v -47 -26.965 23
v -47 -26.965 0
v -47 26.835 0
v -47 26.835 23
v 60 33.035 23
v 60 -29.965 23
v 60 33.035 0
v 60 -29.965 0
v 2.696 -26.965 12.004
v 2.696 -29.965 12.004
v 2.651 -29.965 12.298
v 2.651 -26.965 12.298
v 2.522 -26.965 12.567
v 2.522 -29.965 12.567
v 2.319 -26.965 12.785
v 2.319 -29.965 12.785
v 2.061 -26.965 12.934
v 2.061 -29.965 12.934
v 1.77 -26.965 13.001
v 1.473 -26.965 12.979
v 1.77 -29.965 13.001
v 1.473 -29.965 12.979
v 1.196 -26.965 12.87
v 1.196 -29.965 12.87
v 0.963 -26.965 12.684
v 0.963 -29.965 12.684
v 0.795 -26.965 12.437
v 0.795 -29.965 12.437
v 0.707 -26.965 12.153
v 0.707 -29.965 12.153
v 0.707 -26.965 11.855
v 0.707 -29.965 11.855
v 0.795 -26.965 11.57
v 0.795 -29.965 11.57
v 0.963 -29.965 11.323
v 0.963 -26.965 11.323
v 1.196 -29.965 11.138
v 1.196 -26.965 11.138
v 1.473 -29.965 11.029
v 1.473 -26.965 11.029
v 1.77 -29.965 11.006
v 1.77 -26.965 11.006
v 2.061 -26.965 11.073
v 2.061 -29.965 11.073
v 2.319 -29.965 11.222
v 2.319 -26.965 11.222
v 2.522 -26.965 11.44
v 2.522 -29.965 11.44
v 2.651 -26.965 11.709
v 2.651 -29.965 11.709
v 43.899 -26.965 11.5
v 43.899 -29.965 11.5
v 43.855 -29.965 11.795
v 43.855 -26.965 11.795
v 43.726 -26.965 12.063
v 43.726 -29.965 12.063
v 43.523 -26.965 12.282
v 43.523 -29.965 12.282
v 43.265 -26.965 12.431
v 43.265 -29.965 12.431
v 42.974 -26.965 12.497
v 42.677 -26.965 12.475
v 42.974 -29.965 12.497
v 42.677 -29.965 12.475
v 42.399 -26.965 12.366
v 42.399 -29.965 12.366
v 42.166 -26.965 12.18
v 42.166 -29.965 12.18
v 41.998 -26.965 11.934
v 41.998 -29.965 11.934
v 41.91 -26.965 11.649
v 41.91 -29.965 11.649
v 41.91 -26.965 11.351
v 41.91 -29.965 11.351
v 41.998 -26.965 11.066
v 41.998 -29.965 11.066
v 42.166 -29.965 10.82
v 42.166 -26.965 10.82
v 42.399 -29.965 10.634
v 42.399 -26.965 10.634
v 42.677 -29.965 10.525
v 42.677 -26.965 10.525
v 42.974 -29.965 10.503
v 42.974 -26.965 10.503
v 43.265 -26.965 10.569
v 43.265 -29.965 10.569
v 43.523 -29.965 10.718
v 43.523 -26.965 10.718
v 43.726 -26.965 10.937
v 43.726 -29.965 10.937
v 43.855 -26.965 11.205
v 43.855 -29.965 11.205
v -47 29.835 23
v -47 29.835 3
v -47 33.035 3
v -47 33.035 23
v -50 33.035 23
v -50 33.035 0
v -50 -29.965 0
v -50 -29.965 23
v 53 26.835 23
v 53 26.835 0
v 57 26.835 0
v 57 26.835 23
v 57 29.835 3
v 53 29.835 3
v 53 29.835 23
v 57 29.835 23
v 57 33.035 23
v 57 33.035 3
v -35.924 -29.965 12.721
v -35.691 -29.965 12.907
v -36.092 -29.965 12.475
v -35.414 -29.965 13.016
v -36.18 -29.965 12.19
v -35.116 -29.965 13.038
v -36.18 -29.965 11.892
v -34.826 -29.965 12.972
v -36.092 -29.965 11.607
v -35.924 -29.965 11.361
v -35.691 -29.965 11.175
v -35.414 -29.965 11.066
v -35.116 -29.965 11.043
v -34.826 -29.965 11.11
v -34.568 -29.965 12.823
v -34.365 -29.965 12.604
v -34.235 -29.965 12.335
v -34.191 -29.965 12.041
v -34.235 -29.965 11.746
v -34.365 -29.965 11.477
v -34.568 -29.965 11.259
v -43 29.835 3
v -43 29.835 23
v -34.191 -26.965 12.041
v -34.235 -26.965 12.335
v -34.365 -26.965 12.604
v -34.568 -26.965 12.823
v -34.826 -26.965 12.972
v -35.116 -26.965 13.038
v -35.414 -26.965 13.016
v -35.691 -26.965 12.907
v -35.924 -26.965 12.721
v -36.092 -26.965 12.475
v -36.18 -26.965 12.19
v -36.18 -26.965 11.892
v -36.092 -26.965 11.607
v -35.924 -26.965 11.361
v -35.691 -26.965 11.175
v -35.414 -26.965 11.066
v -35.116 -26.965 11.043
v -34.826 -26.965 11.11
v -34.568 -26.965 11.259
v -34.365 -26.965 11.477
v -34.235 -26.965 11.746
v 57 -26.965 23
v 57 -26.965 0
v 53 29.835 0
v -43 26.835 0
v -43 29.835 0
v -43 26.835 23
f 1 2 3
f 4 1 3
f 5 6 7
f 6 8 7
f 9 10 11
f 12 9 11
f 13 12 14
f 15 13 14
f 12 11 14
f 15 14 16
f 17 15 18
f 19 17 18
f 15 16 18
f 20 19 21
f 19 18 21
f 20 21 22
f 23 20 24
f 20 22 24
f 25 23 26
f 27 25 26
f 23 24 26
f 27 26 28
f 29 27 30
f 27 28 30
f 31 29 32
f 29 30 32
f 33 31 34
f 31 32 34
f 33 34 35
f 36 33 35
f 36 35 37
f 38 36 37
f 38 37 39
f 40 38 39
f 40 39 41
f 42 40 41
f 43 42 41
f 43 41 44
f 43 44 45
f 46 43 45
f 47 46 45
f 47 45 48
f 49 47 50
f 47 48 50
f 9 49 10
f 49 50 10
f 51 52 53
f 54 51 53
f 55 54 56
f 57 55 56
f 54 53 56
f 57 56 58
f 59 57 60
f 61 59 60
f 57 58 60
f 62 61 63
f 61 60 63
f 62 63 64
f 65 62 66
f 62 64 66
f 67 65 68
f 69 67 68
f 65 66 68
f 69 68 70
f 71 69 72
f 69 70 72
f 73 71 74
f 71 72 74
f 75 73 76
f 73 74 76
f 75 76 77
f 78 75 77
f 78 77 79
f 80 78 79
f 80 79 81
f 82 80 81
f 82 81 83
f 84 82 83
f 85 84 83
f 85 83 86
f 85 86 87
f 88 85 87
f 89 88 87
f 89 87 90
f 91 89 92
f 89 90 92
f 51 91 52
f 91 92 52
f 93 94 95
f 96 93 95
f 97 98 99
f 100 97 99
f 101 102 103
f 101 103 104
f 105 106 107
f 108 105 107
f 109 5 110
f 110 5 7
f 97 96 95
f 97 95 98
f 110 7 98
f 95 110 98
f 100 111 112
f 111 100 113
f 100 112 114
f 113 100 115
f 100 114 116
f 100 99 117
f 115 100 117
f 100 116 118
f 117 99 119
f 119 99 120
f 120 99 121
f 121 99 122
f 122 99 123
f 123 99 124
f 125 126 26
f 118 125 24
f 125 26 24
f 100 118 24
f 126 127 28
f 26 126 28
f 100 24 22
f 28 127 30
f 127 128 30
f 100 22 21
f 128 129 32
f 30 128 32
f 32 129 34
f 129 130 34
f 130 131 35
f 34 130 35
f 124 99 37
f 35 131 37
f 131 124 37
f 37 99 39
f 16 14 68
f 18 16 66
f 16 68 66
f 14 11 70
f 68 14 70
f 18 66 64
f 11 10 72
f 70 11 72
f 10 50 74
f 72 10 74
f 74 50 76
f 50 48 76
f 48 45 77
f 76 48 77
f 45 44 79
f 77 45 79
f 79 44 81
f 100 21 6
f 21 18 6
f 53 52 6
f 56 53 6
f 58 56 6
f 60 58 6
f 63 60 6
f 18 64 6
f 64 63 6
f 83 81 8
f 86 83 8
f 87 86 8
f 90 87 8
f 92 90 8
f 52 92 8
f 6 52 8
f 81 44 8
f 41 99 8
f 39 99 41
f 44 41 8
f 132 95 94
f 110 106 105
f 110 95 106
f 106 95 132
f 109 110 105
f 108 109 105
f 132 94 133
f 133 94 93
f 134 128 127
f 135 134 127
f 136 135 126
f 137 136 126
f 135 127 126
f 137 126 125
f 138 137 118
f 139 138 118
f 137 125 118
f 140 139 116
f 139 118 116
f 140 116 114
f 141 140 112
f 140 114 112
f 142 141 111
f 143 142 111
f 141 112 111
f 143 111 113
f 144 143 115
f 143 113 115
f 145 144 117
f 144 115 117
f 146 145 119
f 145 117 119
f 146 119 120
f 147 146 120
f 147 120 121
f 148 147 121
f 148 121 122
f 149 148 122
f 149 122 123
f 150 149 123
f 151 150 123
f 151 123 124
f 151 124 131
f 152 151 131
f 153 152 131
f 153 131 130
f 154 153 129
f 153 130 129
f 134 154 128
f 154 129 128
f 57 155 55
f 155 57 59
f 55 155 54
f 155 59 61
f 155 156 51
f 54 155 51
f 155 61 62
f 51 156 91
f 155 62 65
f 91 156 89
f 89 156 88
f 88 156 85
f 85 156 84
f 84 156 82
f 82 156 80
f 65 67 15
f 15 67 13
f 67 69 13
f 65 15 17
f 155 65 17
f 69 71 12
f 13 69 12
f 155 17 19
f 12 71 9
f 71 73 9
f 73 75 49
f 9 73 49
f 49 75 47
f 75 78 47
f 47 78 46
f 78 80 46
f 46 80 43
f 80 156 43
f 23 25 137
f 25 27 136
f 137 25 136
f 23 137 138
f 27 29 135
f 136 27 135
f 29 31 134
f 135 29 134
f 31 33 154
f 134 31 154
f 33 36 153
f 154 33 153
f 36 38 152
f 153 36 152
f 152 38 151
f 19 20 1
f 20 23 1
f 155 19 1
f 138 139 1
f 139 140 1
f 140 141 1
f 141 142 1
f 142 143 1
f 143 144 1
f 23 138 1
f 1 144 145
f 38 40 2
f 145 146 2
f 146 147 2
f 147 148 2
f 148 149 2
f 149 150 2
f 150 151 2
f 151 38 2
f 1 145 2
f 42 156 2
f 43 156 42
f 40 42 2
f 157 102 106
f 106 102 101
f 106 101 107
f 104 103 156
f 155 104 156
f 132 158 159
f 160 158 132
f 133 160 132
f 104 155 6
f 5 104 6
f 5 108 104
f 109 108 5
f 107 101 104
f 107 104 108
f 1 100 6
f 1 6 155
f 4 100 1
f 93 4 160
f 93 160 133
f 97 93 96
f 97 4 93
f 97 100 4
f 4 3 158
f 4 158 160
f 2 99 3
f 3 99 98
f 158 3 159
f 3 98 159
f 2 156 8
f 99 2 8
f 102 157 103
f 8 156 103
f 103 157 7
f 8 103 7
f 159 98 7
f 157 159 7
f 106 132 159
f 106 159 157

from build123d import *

# Parameters (mm, degrees)
F0_R      = 8
F1_DEPTH  = 3
F2_W      = 3
F2_H      = 3
F2_W_2    = 104
F3_DEPTH  = 20
F4_W      = 3
F4_H      = 20
F5_DEPTH  = 104.4
F6_W      = 96
F6_H      = 3
F7_DEPTH  = 40
F8_R      = 1.5
F9_DEPTH  = 3
F10_R     = 8
F12_DEPTH = 40
F13_R     = 1
F14_DEPTH = 3


with BuildPart() as f1:
    # F0 (on Top) → F1 (new body)
    with BuildSketch(Plane.XY):
        Polygon((-40, 33.034884), (-50, 33.034884), (-50, 18.034884), (-50, 0.034884), (-50, -2.965116), (-50, -17.965116), (-50, -29.965116), (60, -29.965116), (60, -24.965116), (60, -14.965116), (60, -9.965116), (60, -4.965116), (60, 0.034884), (60, 18.034884), (60, 33.034884), (40, 33.034884), (20, 33.034884), (0, 33.034884), (-20, 33.034884), align=None)
        with Locations((25, -0.468963)):
            Circle(F0_R, mode=Mode.SUBTRACT)
        with Locations((-15, 1.034884)):
            Circle(F0_R, mode=Mode.SUBTRACT)
    extrude(amount=F1_DEPTH)

    # F2 (on face) → F3 (join)
    with BuildSketch(Plane.XY.offset(3)):
        with Locations((-48.5, -28.465116)):
            Rectangle(F2_W, F2_H)
        with Locations((5, -28.465116)):
            Rectangle(F2_W_2, F2_H)
        Polygon((-50, 30.034884), (-50, -26.965116), (-47, -26.965116), (-47, 33.034884), (-50, 33.034884), align=None)
        with Locations((58.5, -28.465116)):
            Rectangle(F2_W, F2_H)
        Polygon((57, 33.034884), (57, -26.965116), (60, -26.965116), (60, 30.034884), (60, 33.034884), align=None)
    extrude(amount=F3_DEPTH)

    # F4 (on face) → F5 (join)
    with BuildSketch(Plane.YZ.offset(-47)):
        with Locations((28.334884, 13)):
            Rectangle(F4_W, F4_H)
    extrude(amount=F5_DEPTH)

    # F6 (on face) → F7 (cut)
    with BuildSketch(Plane.XY.offset(23)):
        with Locations((5, 28.334884)):
            Rectangle(F6_W, F6_H)
    extrude(amount=-F7_DEPTH, mode=Mode.SUBTRACT)

    # F8 (on face) → F9 (cut)
    with BuildSketch(Plane(origin=(0, -26.965116, 0), x_dir=(-1, 0, 0), z_dir=(0, 1, 0))):
        with Locations((17, 26.988985)):
            Circle(F8_R)
        with Locations((-27, 26.988985)):
            Circle(F8_R)
        with Locations((-20, 26.988985)):
            Circle(F8_R)
    extrude(amount=-F9_DEPTH, mode=Mode.SUBTRACT)

    # F10 (on face) → F12 (cut)
    with BuildSketch(Plane.XY.offset(3)):
        Polygon((53, 26.834884), (-43, 26.834884), (-47, 26.834884), (-47, -26.965116), (57, -26.965116), (57, 26.834884), align=None)
        with Locations((25, -0.468963)):
            Circle(F10_R, mode=Mode.SUBTRACT)
        with Locations((-15, 1.034884)):
            Circle(F10_R, mode=Mode.SUBTRACT)
    extrude(amount=-F12_DEPTH, mode=Mode.SUBTRACT)

    # F13 (on face) → F14 (cut)
    with BuildSketch(Plane.XZ.offset(29.965116)):
        with Locations((-35.19102, 12.040687)):
            Circle(F13_R)
        with Locations((1.695728, 12.003587)):
            Circle(F13_R)
        with Locations((42.899329, 11.5)):
            Circle(F13_R)
    extrude(amount=-F14_DEPTH, mode=Mode.SUBTRACT)


solid = f1.part
